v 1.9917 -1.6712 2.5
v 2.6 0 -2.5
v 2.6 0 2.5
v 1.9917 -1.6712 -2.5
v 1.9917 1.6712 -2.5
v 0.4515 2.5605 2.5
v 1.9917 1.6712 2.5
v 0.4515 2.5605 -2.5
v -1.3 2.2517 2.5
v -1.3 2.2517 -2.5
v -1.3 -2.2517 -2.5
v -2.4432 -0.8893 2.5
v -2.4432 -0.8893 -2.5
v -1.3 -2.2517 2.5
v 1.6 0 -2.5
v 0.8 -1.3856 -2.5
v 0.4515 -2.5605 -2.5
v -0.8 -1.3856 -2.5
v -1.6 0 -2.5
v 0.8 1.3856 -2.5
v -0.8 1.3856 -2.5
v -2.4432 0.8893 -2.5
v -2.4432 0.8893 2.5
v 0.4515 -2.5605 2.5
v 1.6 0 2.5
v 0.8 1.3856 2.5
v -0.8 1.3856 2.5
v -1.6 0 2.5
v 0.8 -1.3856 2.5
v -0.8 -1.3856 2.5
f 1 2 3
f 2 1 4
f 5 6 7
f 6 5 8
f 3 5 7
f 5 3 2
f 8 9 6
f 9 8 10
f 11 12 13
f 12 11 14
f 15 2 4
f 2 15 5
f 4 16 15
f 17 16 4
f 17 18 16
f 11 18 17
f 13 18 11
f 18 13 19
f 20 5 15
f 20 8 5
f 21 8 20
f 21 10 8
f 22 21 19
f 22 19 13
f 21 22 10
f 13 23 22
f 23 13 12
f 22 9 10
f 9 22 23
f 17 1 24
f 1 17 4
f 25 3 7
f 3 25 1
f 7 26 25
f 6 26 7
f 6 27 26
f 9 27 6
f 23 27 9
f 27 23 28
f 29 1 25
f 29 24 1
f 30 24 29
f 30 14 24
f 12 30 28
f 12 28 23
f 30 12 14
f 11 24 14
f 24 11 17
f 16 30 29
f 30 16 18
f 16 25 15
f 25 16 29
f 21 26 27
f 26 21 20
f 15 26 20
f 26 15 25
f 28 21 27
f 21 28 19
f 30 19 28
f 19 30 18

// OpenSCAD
height = 5;
difference(){
    cylinder(h=height,d=5.2, center = true);
    cylinder(h=height,d=3.2, center = true);
}
